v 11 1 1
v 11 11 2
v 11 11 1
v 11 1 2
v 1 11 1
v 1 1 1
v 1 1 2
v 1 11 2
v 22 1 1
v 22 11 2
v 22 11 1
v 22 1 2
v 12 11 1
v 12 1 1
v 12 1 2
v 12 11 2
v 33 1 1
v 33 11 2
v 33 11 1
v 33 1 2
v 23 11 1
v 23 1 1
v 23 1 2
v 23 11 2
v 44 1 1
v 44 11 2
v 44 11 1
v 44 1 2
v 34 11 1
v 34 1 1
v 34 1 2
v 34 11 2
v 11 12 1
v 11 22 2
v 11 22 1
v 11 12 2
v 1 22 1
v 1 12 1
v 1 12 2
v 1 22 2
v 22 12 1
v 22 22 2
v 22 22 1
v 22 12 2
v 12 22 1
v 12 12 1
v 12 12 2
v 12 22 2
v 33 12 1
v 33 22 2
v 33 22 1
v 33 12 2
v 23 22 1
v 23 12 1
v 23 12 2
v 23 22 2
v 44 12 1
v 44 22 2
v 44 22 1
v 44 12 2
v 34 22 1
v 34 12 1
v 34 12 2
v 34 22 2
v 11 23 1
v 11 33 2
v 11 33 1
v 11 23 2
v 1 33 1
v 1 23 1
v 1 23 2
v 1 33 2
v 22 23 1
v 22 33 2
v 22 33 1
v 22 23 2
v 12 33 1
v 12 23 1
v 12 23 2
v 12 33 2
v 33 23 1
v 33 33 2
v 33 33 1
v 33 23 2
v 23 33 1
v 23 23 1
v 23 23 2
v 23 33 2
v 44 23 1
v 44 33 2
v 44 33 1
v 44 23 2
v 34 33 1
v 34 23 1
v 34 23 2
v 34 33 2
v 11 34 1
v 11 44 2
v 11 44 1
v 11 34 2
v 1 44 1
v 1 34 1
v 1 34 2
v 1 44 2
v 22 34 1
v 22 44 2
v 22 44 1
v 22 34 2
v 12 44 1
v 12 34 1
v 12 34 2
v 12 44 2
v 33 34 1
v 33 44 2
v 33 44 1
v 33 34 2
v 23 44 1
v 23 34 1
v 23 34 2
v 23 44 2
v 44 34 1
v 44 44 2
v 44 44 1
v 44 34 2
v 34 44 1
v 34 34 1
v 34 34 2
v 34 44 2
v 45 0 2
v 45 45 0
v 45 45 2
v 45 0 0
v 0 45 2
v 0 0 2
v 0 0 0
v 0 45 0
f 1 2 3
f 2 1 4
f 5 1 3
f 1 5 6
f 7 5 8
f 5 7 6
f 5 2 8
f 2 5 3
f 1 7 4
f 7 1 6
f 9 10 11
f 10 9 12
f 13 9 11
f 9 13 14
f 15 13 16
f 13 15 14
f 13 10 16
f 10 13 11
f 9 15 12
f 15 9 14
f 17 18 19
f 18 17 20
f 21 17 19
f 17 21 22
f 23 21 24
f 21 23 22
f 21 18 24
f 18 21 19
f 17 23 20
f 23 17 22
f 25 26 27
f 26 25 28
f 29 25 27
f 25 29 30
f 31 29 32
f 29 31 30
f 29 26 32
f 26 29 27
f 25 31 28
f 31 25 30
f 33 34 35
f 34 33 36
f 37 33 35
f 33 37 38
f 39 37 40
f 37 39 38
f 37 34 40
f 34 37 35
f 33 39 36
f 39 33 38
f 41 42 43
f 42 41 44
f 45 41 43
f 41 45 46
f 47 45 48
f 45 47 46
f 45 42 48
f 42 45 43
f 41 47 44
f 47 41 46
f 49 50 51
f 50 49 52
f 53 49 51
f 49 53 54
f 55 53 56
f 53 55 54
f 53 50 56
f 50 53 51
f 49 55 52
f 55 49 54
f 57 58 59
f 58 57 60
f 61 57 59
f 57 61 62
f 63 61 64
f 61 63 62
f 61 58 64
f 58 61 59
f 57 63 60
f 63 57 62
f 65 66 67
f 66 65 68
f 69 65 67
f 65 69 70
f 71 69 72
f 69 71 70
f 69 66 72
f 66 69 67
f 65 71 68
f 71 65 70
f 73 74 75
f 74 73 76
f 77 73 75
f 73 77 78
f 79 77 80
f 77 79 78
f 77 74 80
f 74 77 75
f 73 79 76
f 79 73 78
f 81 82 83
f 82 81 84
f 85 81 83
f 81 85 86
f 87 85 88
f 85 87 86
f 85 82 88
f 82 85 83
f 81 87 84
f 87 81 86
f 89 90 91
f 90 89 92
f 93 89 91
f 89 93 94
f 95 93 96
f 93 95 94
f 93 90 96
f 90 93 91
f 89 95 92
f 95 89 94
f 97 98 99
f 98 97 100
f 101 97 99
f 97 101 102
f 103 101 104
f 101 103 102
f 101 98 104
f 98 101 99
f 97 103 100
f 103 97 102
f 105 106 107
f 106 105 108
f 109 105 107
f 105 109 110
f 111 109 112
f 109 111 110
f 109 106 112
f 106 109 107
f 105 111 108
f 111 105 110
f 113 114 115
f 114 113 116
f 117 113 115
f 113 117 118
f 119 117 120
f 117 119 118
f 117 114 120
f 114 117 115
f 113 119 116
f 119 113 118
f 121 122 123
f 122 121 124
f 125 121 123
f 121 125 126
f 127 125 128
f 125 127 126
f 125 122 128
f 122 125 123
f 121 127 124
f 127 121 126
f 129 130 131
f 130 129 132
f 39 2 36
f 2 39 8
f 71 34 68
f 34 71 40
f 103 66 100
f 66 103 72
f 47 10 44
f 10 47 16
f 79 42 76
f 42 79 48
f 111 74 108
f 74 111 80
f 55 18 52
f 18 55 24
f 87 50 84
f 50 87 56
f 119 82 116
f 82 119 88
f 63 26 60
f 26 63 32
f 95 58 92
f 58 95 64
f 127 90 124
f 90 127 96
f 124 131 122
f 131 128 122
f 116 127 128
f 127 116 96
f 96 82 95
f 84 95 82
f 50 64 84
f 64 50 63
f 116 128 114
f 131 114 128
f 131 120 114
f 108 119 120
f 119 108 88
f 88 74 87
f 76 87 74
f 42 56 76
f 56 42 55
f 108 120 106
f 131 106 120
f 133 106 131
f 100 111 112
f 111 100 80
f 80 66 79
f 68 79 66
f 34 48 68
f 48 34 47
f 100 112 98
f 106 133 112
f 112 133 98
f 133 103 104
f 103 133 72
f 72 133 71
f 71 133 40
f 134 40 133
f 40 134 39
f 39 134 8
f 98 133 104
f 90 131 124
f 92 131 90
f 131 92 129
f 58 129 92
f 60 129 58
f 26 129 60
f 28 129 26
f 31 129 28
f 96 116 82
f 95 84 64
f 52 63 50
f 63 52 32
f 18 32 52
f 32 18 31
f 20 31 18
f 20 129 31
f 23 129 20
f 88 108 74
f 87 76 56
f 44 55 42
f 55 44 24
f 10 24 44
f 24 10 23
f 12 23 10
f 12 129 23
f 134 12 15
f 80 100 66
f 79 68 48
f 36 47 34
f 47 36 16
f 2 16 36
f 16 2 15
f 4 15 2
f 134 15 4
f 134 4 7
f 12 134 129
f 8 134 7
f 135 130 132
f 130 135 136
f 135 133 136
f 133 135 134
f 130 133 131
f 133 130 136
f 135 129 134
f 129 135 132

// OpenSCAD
/*
 * Machdyne PNP
 * Copyright (c) 2023 Lone Dynamics Corporation. All rights reserved.
 *
 * Tray Feeder
 *
 */

part_x = 10 + 0.0;
part_y = 10 + 0.0;

gap = 1.0;
rows = 4;
cols = 4;

tf();

module tf() {

	difference() {
		
		cube([cols*(part_x+gap)+gap,rows*(part_y+gap)+gap,2]);
		
		for (y = [0:rows-1]) {
			for (x = [0:cols-1]) {
				translate([gap+x*(part_x+gap),gap+y*(part_y+gap),1]) cube([part_x,part_y,2]);
			}
		}
		
	}
	
}
